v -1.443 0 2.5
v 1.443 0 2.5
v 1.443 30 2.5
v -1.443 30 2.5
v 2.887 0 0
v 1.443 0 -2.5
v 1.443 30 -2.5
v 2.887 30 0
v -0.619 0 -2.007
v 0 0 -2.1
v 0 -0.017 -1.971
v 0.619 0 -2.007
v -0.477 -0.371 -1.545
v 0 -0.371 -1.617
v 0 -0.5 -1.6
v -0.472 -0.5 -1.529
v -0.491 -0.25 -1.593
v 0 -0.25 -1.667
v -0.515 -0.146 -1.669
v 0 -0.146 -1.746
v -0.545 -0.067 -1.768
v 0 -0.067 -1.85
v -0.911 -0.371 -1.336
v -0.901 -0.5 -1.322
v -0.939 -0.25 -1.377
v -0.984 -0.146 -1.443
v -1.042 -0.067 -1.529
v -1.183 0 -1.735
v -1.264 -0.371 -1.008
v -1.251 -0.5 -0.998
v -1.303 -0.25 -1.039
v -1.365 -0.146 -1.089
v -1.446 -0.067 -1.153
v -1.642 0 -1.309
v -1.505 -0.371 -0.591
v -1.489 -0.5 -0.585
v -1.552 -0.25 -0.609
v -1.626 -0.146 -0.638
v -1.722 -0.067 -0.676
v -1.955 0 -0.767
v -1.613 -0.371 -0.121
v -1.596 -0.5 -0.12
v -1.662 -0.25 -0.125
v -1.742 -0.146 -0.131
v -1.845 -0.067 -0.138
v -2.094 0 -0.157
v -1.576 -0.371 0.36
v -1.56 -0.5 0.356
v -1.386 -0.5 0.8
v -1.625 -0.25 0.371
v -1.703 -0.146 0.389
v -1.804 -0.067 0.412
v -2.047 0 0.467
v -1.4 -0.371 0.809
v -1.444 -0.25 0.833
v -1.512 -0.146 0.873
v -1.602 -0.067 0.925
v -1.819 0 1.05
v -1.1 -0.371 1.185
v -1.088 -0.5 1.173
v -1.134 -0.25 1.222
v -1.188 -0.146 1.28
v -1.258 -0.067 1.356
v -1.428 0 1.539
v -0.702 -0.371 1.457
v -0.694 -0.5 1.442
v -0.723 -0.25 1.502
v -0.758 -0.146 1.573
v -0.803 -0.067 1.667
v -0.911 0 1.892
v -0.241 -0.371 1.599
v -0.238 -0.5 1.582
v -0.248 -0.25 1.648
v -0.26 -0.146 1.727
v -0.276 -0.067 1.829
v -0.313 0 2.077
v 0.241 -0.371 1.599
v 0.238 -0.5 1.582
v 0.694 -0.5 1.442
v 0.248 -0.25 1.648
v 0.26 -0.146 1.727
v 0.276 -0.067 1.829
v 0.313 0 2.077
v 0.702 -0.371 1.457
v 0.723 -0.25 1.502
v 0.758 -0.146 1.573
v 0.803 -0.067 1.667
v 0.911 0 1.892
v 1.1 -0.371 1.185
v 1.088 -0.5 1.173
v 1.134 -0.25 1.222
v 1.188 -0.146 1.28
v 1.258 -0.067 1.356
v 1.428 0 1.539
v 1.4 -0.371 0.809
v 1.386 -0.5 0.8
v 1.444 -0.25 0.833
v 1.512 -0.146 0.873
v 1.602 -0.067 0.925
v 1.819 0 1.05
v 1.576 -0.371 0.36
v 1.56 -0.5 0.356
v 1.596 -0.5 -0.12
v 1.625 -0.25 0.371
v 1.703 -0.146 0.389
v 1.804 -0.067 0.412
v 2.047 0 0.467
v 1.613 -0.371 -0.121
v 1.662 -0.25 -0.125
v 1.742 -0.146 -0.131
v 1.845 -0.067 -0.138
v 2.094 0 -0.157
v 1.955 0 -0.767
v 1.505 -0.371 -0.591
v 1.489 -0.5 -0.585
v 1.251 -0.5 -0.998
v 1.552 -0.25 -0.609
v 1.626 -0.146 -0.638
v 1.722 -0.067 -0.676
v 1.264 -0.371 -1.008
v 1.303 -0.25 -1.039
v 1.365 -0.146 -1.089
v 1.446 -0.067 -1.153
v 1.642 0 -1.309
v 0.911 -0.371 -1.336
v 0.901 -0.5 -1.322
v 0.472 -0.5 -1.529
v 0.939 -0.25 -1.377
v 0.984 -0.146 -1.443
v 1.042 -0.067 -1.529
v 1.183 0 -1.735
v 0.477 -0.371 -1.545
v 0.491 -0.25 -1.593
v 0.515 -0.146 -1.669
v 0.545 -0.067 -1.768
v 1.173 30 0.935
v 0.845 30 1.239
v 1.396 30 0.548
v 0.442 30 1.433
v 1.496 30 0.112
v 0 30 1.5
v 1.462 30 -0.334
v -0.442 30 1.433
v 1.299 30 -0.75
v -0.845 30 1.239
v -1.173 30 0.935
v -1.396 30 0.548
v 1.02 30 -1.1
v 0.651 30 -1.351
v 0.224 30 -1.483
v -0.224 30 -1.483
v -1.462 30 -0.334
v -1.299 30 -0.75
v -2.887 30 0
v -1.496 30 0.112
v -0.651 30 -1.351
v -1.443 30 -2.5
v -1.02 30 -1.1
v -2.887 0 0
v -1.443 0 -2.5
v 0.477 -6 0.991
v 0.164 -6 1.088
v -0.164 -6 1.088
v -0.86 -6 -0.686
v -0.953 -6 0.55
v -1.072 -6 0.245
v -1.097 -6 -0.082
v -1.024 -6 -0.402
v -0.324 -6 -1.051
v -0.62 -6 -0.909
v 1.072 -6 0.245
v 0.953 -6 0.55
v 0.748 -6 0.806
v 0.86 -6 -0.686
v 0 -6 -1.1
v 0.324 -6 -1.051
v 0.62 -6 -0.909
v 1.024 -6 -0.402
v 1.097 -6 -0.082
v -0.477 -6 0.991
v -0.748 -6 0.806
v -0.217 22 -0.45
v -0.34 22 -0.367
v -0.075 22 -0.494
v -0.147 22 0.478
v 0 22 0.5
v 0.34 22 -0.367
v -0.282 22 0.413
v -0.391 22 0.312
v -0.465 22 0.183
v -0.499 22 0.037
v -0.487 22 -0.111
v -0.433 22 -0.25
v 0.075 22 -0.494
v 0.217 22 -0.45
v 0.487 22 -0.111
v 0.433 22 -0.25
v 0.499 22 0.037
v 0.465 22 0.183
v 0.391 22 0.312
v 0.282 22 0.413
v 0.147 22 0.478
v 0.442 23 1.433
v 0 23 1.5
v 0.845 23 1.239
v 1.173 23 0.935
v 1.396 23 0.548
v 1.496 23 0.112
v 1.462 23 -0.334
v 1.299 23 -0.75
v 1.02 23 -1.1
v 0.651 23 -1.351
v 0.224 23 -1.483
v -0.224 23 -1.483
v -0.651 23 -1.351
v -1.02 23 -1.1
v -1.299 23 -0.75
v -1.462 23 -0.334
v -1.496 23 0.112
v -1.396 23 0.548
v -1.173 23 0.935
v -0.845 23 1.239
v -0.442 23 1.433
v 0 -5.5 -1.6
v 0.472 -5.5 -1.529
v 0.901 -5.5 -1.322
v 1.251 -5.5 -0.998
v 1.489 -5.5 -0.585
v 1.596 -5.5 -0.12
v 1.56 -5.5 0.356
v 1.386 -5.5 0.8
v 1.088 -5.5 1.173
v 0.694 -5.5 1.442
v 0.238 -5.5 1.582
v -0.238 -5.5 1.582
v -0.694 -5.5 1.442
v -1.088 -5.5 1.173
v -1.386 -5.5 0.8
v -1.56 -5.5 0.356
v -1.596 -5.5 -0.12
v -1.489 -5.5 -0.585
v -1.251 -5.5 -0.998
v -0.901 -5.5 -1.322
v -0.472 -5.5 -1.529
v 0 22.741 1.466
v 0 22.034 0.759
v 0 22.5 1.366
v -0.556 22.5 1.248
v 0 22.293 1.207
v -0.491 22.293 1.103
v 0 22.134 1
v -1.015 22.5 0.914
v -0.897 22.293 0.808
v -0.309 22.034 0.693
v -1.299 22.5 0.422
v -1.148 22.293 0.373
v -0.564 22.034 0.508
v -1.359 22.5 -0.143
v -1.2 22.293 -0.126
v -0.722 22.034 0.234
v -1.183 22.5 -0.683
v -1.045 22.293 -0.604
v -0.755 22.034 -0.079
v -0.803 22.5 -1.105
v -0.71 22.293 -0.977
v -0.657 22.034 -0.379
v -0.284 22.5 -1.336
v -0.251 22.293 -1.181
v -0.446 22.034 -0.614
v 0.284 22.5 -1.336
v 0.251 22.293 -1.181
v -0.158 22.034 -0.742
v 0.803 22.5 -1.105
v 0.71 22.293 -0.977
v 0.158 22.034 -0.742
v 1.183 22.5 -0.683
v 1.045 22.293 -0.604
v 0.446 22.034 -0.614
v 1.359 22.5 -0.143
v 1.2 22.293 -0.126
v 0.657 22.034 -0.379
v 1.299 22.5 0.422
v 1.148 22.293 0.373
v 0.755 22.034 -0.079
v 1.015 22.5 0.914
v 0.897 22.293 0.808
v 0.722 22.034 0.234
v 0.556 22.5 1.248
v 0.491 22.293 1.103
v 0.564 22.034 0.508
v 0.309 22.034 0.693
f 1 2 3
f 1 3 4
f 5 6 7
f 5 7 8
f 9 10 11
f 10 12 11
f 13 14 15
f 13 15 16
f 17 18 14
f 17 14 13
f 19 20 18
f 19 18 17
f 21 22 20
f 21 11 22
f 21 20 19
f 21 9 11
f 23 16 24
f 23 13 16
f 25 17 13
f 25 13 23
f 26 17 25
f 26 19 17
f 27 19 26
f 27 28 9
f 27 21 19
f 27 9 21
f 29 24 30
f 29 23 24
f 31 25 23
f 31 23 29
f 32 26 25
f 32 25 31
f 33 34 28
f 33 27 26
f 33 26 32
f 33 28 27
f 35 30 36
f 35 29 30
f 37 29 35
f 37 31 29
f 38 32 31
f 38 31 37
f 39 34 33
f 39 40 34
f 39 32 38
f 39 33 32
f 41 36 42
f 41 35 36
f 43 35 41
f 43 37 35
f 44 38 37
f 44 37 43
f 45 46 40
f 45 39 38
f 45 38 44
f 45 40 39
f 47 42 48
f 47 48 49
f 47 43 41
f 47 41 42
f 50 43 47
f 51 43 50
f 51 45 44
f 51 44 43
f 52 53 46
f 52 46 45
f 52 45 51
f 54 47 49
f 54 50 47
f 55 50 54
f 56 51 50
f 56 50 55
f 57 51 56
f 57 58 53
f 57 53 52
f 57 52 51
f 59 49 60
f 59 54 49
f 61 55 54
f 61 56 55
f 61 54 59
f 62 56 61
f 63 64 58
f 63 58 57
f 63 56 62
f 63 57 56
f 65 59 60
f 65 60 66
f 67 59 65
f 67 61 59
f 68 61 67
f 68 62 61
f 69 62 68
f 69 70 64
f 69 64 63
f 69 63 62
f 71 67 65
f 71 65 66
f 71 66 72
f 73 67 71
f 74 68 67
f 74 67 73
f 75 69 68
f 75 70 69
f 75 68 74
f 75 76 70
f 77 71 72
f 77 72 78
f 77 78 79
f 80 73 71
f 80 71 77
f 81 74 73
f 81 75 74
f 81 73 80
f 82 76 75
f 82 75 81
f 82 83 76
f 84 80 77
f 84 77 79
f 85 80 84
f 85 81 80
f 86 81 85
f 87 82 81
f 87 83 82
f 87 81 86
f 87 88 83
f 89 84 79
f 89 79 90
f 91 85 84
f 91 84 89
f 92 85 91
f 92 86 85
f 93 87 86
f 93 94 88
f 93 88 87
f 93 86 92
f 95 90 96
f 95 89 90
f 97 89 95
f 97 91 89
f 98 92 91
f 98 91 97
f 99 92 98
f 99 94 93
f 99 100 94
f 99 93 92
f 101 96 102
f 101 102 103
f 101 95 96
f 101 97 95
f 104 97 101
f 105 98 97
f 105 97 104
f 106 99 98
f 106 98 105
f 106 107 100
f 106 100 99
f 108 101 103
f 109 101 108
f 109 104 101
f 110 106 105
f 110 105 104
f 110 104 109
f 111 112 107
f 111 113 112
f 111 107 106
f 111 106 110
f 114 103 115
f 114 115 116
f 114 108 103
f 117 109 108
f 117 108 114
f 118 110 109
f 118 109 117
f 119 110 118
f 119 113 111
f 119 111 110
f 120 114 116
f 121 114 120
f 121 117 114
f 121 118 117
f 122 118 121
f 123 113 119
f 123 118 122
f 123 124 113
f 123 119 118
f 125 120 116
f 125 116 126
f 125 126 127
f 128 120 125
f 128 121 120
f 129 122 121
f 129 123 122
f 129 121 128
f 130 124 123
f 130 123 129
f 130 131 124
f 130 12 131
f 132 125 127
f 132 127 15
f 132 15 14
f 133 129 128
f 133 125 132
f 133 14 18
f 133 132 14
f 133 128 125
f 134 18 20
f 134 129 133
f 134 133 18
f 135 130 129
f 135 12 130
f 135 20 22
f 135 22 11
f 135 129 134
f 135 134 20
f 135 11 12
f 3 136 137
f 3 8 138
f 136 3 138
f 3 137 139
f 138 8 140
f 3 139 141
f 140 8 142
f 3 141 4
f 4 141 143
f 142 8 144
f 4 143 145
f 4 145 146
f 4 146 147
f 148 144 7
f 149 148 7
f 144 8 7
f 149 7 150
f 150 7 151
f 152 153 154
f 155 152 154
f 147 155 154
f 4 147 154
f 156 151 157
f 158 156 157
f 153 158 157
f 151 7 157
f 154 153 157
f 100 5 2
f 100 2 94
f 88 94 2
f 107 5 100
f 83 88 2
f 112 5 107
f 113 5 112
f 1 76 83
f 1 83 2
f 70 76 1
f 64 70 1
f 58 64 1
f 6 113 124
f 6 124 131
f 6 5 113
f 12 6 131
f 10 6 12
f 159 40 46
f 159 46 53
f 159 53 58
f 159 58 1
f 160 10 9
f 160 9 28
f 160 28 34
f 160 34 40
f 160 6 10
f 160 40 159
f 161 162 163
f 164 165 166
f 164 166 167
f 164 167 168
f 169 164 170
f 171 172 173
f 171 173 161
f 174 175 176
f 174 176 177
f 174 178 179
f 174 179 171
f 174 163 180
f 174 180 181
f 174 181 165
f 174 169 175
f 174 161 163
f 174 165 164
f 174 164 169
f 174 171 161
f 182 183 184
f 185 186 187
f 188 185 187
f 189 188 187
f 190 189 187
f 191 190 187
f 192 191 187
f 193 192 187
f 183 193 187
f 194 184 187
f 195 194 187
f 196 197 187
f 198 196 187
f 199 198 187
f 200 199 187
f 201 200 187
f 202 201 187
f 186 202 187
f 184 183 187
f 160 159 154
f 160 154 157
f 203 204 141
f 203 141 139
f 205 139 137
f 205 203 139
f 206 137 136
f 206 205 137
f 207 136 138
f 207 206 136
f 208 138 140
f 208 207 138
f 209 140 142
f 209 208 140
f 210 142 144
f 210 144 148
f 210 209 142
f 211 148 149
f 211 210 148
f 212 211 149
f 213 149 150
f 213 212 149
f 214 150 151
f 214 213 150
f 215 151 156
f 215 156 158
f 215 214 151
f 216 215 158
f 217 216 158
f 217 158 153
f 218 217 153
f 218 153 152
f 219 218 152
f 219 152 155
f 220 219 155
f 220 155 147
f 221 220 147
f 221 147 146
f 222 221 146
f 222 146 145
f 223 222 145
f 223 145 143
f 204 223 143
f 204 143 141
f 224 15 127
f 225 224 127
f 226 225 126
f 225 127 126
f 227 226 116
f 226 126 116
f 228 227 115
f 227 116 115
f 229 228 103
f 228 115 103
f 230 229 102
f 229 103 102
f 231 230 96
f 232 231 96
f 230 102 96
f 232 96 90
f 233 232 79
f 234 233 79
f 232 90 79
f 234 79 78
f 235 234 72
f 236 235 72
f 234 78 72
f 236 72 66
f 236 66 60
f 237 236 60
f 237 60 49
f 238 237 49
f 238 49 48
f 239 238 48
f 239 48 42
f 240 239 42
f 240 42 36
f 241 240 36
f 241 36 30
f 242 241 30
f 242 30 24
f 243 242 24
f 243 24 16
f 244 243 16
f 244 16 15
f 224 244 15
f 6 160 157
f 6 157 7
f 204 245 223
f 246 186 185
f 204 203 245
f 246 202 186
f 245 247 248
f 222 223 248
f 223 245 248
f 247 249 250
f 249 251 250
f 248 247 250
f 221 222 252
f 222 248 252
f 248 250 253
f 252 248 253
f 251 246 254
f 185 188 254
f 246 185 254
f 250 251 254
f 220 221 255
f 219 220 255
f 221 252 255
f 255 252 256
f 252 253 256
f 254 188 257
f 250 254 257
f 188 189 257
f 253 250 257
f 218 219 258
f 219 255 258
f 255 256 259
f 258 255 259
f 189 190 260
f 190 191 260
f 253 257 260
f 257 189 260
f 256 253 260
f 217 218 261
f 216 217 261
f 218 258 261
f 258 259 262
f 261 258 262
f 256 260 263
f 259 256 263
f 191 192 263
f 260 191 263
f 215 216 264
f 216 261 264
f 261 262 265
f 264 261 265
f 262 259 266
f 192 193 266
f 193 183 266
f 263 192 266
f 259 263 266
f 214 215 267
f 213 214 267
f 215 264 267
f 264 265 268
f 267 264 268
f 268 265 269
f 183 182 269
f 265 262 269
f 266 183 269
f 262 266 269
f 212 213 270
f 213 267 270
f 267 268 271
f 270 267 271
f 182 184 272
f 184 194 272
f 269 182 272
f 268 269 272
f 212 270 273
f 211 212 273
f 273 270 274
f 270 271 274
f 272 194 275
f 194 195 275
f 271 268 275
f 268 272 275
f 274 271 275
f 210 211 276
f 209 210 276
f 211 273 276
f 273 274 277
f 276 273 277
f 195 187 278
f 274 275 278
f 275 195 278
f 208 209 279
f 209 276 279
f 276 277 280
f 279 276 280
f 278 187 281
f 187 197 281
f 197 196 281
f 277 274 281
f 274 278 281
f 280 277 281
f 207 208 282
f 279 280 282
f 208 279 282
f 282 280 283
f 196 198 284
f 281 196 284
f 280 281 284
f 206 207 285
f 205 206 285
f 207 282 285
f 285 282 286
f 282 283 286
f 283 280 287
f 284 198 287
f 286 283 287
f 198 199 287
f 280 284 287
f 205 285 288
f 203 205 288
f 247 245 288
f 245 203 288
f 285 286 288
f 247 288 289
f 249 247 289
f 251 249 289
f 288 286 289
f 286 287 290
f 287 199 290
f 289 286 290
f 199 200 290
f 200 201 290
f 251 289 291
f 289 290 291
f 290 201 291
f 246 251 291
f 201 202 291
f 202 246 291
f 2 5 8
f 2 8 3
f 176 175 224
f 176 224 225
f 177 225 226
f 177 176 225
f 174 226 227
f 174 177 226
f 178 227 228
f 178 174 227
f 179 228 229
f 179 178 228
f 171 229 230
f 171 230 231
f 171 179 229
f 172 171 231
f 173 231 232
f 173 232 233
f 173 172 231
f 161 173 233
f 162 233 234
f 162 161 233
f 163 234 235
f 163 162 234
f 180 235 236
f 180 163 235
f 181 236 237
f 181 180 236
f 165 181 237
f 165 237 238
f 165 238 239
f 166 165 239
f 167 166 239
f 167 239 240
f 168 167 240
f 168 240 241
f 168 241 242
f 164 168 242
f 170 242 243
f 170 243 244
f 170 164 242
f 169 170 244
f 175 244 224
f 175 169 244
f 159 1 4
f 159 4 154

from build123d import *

# Parameters (mm, degrees)
SKETCH1_R           = 1.5
EXTRUDE1_DEPTH      = 30
EXTRUDE2_DEPTH      = 6
EXTRUDE2_DEPTH_BACK = 22
SKETCH2_R           = 1.6
CHAMFER1_SIZE       = 0.5
FILLET1_R           = 0.5
FILLET2_R           = 1


with BuildPart() as part:
    # Sketch1 → Extrude1 (new body)
    with BuildSketch(Plane(origin=(0, 0, 0), x_dir=(1, 0, 0), z_dir=(0, 1, 0))):
        Polygon((-1.443375673, 2.5), (1.443375673, 2.5), (2.886751346, 0), (1.443375673, -2.5), (-1.443375673, -2.5), (-2.886751346, 0), align=None)
        with Locations(Location((0, 0, 0), (0, 0, 270))):
            Circle(SKETCH1_R, mode=Mode.SUBTRACT)
    extrude(amount=EXTRUDE1_DEPTH)

    # Sketch2 → Extrude2 (add, two sides: drawn at the far end of the back side and taken through both)
    with BuildSketch(Plane.XZ.offset(-EXTRUDE2_DEPTH_BACK)):
        with Locations(Location((0, 0, 0), (0, 0, 270))):
            Circle(SKETCH2_R)
    extrude(amount=EXTRUDE2_DEPTH + EXTRUDE2_DEPTH_BACK)

    # Chamfer1
    chamfer1_edges = [part.edges().sort_by_distance(p)[0] for p in [
        (0, -6, 1.6),
    ]]
    chamfer(chamfer1_edges, length=CHAMFER1_SIZE)

    # Fillet1
    fillet1_edges = [part.edges().sort_by_distance(p)[0] for p in [
        (0, 0, 1.6),
    ]]
    fillet(fillet1_edges, radius=FILLET1_R)

    # Fillet2
    fillet2_edges = [part.edges().sort_by_distance(p)[0] for p in [
        (0, 22, -1.5),
    ]]
    fillet(fillet2_edges, radius=FILLET2_R)


solid = part.part
